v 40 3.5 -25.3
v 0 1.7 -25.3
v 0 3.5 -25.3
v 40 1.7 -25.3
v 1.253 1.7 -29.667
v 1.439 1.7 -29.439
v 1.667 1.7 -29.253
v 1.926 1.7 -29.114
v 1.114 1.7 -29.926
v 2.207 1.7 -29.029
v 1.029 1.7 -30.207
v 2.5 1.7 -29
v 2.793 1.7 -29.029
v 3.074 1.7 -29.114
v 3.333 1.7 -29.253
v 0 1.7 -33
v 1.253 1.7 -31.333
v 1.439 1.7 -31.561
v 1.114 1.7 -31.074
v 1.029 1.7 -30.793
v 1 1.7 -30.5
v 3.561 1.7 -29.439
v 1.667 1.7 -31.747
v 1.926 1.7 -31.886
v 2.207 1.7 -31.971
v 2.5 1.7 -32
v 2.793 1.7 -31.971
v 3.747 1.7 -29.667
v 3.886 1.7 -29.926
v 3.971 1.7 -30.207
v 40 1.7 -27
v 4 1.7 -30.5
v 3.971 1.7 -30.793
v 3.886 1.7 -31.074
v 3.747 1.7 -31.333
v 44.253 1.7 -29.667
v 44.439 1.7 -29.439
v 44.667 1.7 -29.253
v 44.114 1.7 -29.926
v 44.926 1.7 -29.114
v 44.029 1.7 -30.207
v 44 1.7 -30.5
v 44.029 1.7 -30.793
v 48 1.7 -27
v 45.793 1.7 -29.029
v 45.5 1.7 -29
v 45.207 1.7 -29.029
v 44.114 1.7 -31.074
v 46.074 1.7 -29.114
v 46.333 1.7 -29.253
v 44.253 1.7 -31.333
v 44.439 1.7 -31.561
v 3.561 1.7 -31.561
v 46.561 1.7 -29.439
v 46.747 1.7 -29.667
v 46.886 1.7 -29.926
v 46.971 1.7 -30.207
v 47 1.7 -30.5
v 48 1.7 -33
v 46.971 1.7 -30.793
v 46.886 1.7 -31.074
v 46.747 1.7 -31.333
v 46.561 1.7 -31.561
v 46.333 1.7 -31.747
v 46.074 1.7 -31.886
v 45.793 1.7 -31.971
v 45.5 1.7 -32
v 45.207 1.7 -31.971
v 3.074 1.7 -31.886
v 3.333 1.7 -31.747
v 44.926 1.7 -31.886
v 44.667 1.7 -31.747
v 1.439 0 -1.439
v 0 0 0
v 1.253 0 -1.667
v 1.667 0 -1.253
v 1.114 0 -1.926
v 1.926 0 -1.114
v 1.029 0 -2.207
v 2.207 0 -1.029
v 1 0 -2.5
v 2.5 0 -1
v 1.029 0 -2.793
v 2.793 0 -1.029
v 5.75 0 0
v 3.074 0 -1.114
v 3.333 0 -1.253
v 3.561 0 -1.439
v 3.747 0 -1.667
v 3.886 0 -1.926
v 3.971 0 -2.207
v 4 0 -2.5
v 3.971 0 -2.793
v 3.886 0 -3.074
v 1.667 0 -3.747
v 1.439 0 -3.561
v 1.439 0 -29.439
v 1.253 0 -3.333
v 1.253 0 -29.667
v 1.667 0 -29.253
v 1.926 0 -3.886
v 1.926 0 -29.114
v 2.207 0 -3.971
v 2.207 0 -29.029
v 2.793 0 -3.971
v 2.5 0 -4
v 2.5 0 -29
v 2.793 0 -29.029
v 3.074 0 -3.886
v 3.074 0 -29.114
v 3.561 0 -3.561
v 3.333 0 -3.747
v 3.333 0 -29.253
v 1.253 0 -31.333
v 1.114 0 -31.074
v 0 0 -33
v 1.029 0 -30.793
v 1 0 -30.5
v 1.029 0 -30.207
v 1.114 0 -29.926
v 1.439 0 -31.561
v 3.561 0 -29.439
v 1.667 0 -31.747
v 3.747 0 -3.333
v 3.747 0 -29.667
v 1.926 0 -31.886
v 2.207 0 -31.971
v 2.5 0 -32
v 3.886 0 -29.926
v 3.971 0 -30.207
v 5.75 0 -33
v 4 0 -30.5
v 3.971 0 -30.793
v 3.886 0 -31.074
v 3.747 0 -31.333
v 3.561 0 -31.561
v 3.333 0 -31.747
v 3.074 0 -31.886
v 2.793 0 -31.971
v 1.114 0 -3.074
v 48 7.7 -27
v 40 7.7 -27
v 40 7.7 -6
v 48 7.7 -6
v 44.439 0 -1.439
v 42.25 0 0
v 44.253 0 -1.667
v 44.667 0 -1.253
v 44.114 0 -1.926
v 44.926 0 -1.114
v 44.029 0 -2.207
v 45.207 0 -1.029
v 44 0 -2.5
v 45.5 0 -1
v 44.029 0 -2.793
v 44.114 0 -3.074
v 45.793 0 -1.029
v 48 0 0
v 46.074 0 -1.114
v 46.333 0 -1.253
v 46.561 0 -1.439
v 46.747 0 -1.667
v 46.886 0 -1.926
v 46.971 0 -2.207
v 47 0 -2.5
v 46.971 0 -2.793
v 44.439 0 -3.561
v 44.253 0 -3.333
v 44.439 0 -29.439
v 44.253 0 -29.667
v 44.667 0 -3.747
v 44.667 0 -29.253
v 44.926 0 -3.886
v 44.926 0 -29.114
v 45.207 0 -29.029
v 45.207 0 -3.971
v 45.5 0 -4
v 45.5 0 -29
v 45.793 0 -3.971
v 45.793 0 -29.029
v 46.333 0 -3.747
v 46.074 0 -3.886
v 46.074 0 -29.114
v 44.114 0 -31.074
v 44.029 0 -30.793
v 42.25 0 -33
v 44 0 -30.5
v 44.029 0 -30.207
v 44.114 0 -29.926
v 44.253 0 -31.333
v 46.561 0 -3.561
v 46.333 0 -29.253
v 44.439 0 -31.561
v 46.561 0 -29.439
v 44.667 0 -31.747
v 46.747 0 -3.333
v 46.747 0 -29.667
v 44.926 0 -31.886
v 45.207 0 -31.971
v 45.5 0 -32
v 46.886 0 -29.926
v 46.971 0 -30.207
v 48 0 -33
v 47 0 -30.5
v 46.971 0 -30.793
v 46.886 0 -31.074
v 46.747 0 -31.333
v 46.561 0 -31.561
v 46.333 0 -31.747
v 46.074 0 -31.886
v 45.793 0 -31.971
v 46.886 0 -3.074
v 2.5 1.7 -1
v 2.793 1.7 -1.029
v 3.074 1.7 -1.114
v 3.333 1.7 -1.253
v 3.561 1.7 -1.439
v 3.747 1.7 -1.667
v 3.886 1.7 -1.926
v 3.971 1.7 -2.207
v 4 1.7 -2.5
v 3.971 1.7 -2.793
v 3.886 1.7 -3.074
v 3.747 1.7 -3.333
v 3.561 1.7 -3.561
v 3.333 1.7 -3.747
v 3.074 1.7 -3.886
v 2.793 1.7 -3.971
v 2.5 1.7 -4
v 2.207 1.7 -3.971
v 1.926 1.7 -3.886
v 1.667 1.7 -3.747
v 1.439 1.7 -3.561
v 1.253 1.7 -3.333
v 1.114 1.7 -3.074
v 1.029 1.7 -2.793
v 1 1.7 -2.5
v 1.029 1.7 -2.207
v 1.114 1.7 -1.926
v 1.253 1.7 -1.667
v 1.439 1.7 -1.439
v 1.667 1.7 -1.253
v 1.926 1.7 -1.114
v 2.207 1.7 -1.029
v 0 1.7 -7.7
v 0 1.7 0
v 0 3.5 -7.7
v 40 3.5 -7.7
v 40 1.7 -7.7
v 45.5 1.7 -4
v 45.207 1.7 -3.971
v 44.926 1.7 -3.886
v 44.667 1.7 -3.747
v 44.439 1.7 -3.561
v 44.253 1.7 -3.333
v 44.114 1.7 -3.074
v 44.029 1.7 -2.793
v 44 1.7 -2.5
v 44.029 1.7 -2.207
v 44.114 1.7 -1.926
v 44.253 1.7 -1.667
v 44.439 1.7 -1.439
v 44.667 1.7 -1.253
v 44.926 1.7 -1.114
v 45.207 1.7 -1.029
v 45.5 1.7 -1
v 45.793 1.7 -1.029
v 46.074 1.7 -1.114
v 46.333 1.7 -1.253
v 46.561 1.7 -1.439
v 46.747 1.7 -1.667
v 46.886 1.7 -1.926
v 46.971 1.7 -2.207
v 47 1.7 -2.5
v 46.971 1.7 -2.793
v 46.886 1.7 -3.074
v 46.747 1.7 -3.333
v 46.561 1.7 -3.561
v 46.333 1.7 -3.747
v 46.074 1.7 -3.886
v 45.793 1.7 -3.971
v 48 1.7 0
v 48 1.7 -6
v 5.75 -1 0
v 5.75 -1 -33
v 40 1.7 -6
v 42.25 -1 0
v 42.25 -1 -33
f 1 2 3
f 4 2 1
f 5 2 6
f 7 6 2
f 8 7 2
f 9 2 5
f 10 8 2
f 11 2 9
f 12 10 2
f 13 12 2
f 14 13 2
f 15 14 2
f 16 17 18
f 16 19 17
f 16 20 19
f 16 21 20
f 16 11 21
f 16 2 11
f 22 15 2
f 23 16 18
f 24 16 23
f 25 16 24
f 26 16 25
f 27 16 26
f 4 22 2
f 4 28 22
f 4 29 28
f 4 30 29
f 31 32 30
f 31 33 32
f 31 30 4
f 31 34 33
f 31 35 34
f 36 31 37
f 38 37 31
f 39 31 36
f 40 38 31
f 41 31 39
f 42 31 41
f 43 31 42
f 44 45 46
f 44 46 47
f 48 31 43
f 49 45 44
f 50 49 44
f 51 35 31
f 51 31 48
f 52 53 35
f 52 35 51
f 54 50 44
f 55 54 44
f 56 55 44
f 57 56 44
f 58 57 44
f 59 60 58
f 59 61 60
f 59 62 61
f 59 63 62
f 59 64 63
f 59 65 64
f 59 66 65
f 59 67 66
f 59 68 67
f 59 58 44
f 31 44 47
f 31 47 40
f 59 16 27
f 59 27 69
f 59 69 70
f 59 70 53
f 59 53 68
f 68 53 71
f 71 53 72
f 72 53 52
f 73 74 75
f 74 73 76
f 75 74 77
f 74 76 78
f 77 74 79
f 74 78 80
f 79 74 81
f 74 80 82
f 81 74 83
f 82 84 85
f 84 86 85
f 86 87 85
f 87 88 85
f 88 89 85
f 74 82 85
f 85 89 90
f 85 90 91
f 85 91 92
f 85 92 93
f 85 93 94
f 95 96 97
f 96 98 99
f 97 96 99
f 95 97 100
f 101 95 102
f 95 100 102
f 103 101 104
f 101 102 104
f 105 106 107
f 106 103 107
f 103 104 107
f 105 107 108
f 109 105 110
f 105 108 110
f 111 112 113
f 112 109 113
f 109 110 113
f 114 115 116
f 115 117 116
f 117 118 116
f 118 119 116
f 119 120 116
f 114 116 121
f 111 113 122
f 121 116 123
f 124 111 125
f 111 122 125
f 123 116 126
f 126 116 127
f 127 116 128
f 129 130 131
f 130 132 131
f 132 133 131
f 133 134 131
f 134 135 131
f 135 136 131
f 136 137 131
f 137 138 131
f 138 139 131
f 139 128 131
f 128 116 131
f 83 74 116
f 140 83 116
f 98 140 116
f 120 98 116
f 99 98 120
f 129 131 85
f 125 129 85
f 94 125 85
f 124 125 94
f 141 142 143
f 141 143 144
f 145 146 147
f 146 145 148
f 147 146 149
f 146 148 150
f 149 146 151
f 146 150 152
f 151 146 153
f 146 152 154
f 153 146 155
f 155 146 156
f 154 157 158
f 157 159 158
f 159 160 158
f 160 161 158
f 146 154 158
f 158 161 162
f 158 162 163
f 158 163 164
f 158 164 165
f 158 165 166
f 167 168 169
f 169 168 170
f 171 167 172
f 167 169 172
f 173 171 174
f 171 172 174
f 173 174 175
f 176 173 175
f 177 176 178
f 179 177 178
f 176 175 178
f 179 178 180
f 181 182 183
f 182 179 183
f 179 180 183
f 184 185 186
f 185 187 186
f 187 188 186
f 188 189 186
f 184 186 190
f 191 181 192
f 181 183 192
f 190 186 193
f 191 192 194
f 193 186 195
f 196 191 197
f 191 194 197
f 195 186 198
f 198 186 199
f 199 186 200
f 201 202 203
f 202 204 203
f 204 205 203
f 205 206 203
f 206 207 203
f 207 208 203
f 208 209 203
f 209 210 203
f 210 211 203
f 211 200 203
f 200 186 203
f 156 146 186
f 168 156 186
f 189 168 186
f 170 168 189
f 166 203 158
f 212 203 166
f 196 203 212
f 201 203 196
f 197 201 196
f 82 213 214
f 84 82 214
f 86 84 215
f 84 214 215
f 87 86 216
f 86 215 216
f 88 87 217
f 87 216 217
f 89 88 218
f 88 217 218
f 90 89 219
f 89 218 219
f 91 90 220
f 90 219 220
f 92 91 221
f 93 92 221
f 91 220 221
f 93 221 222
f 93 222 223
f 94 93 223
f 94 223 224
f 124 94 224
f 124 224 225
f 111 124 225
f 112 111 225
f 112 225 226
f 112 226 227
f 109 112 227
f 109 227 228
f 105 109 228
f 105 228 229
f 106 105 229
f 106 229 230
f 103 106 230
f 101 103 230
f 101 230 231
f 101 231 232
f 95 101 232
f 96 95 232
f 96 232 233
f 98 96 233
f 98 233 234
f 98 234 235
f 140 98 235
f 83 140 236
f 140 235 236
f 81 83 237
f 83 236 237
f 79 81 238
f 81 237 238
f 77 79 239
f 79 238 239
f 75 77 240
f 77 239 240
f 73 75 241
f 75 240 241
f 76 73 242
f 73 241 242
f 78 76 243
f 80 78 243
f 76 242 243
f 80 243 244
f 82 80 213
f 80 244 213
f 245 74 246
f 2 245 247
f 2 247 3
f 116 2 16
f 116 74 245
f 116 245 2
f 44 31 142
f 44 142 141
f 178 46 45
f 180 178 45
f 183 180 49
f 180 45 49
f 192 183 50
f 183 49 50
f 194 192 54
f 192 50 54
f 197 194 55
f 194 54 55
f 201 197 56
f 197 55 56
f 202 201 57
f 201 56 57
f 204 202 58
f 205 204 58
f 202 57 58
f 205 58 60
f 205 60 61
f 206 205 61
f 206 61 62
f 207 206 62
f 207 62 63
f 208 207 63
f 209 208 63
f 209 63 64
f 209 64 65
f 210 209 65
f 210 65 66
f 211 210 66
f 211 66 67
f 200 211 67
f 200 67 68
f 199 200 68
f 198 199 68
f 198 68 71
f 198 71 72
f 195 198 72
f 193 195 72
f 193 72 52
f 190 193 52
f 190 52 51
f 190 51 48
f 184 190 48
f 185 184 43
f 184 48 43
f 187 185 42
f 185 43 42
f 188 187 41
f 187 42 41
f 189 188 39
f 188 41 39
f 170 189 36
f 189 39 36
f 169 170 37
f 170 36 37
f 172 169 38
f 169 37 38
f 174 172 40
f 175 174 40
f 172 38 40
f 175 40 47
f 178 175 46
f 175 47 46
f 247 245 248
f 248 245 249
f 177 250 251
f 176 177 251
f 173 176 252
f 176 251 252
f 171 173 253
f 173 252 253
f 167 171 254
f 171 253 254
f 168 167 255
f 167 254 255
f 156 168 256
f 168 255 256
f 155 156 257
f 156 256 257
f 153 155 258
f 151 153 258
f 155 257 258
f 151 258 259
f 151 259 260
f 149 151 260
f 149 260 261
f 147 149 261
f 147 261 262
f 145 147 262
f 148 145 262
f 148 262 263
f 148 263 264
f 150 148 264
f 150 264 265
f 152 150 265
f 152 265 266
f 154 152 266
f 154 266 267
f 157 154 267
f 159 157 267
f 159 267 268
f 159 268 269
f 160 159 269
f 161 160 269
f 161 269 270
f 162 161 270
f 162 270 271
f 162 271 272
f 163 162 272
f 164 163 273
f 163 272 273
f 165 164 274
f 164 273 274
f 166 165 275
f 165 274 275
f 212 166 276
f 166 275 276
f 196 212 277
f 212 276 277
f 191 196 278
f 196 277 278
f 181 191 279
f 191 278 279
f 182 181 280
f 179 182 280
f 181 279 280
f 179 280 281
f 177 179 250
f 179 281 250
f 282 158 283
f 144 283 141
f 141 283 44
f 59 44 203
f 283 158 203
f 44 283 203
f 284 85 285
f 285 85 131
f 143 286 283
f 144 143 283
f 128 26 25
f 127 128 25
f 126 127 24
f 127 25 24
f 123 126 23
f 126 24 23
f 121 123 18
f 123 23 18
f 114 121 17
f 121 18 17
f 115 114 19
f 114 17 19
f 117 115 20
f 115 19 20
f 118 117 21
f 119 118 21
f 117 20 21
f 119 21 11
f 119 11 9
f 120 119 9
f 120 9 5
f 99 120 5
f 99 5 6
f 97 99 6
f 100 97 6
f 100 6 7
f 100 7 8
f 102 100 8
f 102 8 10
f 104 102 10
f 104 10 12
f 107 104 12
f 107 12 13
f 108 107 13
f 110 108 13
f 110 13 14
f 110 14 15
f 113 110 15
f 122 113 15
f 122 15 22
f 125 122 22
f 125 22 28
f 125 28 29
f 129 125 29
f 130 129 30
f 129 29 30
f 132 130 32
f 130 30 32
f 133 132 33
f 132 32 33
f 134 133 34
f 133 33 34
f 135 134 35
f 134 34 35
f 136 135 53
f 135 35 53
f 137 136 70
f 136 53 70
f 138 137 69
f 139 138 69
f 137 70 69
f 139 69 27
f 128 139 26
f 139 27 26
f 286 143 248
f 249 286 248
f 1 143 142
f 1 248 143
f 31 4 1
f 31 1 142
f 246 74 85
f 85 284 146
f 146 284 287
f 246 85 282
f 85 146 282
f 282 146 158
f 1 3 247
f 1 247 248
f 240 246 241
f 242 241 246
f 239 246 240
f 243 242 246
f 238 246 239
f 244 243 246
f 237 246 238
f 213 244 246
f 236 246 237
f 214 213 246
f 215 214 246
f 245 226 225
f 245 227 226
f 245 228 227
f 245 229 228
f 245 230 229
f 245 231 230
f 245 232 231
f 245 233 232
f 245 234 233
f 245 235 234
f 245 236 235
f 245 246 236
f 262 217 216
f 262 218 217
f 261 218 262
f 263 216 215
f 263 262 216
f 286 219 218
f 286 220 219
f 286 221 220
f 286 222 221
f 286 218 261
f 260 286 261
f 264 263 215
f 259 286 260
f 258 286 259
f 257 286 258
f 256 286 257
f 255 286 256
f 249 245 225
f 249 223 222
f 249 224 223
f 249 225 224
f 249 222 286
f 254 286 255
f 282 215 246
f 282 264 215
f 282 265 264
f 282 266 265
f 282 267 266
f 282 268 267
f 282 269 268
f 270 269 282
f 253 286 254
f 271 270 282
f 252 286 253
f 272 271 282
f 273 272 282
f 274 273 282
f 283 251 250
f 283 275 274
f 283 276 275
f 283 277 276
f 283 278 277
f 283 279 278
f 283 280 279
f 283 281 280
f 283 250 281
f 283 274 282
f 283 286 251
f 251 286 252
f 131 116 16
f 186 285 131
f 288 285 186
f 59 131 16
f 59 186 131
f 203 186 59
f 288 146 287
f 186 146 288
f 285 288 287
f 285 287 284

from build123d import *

# Parameters (mm, degrees)
SKETCH1_W           = 48
SKETCH1_H           = 33
BOSS_EXTRUDE1_DEPTH = 1.7
SKETCH2_W           = 8
SKETCH2_H           = 21
BOSS_EXTRUDE2_DEPTH = 6
SKETCH3_R           = 1.5
CUT_EXTRUDE1_DEPTH  = 59.557663888
SKETCH4_W           = 36.5
SKETCH4_H           = 33
BOSS_EXTRUDE3_DEPTH = 1
SKETCH6_W           = 40
SKETCH6_H           = 17.6
BOSS_EXTRUDE4_DEPTH = 1.8


with BuildPart() as part:
    # Sketch1 → Boss-Extrude1 (new body)
    with BuildSketch(Plane(origin=(0, 0, 0), x_dir=(1, 0, 0), z_dir=(0, 1, 0))):
        with Locations((24, 16.5)):
            Rectangle(SKETCH1_W, SKETCH1_H)
    extrude(amount=BOSS_EXTRUDE1_DEPTH)

    # Sketch2 → Boss-Extrude2 (add)
    with BuildSketch(Plane(origin=(0, 1.7, 0), x_dir=(1, 0, 0), z_dir=(0, 1, 0))):
        with Locations((44, 16.5)):
            Rectangle(SKETCH2_W, SKETCH2_H)
    extrude(amount=BOSS_EXTRUDE2_DEPTH)

    # Sketch3 → Cut-Extrude1 (cut, through all)
    with BuildSketch(Plane(origin=(0, 1.7, 0), x_dir=(1, 0, 0), z_dir=(0, 1, 0))):
        with Locations(Location((2.5, 2.5, 0), (0, 0, 270))):
            Circle(SKETCH3_R)
        with Locations(Location((45.5, 2.5, 0), (0, 0, 90))):
            Circle(SKETCH3_R)
        with Locations(Location((45.5, 30.5, 0), (0, 0, 270))):
            Circle(SKETCH3_R)
        with Locations(Location((2.5, 30.5, 0), (0, 0, 90))):
            Circle(SKETCH3_R)
    extrude(amount=-CUT_EXTRUDE1_DEPTH, mode=Mode.SUBTRACT)

    # Sketch4 → Boss-Extrude3 (add)
    with BuildSketch(Plane(origin=(0, 0, 0), x_dir=(-1, 0, 0), z_dir=(0, -1, 0))):
        with Locations((-24, 16.5)):
            Rectangle(SKETCH4_W, SKETCH4_H)
    extrude(amount=BOSS_EXTRUDE3_DEPTH)

    # Sketch6 → Boss-Extrude4 (add)
    with BuildSketch(Plane(origin=(0, 1.7, 0), x_dir=(1, 0, 0), z_dir=(0, 1, 0))):
        with Locations((20, 16.5)):
            Rectangle(SKETCH6_W, SKETCH6_H)
    extrude(amount=BOSS_EXTRUDE4_DEPTH)


solid = part.part
